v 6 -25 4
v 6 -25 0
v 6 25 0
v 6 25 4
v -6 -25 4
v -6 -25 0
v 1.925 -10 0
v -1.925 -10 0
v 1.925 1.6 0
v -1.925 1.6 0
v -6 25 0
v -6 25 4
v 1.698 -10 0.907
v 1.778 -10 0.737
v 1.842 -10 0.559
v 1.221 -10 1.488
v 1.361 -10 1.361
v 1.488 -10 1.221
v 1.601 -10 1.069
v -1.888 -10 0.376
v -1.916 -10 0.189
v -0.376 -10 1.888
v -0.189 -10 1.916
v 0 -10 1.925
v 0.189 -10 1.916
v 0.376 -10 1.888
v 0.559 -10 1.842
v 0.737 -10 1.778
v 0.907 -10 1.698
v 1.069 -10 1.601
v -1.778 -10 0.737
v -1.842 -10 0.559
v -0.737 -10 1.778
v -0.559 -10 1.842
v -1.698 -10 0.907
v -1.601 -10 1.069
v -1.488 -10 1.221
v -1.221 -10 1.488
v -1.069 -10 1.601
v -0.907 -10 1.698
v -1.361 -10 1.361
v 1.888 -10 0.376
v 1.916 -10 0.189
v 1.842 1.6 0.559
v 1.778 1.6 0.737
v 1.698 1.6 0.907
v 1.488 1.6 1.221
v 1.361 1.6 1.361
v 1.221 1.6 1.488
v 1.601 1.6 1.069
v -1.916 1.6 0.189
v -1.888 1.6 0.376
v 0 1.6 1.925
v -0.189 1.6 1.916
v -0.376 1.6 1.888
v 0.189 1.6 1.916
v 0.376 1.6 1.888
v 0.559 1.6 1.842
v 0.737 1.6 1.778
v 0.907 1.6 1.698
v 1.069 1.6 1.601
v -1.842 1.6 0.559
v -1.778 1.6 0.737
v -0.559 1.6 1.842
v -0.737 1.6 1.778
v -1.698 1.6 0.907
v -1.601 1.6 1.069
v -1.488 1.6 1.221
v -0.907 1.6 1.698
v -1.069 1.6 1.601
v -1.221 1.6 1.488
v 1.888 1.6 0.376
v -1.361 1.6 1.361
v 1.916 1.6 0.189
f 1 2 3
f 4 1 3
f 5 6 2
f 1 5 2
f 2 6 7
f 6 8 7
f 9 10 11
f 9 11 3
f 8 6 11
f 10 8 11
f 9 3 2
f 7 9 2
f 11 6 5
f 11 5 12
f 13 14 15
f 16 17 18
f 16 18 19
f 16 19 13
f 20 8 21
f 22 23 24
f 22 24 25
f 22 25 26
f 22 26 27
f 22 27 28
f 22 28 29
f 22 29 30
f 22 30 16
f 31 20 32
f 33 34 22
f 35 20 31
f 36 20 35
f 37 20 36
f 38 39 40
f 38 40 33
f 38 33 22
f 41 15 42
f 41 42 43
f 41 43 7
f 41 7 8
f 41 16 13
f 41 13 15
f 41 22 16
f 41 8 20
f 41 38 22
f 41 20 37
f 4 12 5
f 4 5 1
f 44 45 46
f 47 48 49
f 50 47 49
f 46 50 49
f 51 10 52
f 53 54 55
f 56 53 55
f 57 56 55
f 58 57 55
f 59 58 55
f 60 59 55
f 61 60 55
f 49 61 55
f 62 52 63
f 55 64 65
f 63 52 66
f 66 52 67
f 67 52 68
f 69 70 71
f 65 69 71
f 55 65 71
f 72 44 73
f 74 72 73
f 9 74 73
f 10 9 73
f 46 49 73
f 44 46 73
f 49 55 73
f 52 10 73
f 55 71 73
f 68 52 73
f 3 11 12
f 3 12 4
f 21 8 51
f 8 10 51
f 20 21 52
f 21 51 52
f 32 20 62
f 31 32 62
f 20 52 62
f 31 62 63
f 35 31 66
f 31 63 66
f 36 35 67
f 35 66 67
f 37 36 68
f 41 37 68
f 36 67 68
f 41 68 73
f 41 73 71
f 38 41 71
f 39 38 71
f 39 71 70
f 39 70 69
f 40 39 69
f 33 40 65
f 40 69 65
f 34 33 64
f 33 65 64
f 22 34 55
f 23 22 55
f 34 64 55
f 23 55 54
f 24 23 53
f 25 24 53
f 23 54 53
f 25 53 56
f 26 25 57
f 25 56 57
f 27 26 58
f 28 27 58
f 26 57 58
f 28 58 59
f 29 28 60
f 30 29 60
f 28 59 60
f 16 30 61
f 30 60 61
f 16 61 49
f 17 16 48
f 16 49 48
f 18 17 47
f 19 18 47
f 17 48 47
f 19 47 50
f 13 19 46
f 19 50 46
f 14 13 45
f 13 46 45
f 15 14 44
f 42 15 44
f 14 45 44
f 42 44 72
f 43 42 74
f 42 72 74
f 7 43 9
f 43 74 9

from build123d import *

# Parameters (mm, degrees)
F0_W     = 12
F0_H     = 50
F0_W_2   = 1.925
F0_H_2   = 11.6
F1_DEPTH = 4
F2_ANGLE = 180


with BuildPart() as f1:
    # F0 (on Top) → F1 (new body)
    with BuildSketch(Plane.XY):
        Rectangle(F0_W, F0_H)
        Polygon((1.925, -10), (0, -10), (-1.925, -10), (-1.925, 1.6), (0, 1.6), (1.925, 1.6), align=None, mode=Mode.SUBTRACT)
        with Locations((-0.9625, -4.2)):
            Rectangle(F0_W_2, F0_H_2)
        with Locations((0.9625, -4.2)):
            Rectangle(F0_W_2, F0_H_2)
    extrude(amount=F1_DEPTH)

    # F0 (on Top) → F2 (revolve, cut)
    with BuildSketch(Plane.XY):
        with Locations((-0.9625, -4.2)):
            Rectangle(F0_W_2, F0_H_2)
    revolve(axis=Axis((0, -4.2, 0), (0, 1, 0)), revolution_arc=F2_ANGLE, mode=Mode.SUBTRACT)


solid = f1.part
